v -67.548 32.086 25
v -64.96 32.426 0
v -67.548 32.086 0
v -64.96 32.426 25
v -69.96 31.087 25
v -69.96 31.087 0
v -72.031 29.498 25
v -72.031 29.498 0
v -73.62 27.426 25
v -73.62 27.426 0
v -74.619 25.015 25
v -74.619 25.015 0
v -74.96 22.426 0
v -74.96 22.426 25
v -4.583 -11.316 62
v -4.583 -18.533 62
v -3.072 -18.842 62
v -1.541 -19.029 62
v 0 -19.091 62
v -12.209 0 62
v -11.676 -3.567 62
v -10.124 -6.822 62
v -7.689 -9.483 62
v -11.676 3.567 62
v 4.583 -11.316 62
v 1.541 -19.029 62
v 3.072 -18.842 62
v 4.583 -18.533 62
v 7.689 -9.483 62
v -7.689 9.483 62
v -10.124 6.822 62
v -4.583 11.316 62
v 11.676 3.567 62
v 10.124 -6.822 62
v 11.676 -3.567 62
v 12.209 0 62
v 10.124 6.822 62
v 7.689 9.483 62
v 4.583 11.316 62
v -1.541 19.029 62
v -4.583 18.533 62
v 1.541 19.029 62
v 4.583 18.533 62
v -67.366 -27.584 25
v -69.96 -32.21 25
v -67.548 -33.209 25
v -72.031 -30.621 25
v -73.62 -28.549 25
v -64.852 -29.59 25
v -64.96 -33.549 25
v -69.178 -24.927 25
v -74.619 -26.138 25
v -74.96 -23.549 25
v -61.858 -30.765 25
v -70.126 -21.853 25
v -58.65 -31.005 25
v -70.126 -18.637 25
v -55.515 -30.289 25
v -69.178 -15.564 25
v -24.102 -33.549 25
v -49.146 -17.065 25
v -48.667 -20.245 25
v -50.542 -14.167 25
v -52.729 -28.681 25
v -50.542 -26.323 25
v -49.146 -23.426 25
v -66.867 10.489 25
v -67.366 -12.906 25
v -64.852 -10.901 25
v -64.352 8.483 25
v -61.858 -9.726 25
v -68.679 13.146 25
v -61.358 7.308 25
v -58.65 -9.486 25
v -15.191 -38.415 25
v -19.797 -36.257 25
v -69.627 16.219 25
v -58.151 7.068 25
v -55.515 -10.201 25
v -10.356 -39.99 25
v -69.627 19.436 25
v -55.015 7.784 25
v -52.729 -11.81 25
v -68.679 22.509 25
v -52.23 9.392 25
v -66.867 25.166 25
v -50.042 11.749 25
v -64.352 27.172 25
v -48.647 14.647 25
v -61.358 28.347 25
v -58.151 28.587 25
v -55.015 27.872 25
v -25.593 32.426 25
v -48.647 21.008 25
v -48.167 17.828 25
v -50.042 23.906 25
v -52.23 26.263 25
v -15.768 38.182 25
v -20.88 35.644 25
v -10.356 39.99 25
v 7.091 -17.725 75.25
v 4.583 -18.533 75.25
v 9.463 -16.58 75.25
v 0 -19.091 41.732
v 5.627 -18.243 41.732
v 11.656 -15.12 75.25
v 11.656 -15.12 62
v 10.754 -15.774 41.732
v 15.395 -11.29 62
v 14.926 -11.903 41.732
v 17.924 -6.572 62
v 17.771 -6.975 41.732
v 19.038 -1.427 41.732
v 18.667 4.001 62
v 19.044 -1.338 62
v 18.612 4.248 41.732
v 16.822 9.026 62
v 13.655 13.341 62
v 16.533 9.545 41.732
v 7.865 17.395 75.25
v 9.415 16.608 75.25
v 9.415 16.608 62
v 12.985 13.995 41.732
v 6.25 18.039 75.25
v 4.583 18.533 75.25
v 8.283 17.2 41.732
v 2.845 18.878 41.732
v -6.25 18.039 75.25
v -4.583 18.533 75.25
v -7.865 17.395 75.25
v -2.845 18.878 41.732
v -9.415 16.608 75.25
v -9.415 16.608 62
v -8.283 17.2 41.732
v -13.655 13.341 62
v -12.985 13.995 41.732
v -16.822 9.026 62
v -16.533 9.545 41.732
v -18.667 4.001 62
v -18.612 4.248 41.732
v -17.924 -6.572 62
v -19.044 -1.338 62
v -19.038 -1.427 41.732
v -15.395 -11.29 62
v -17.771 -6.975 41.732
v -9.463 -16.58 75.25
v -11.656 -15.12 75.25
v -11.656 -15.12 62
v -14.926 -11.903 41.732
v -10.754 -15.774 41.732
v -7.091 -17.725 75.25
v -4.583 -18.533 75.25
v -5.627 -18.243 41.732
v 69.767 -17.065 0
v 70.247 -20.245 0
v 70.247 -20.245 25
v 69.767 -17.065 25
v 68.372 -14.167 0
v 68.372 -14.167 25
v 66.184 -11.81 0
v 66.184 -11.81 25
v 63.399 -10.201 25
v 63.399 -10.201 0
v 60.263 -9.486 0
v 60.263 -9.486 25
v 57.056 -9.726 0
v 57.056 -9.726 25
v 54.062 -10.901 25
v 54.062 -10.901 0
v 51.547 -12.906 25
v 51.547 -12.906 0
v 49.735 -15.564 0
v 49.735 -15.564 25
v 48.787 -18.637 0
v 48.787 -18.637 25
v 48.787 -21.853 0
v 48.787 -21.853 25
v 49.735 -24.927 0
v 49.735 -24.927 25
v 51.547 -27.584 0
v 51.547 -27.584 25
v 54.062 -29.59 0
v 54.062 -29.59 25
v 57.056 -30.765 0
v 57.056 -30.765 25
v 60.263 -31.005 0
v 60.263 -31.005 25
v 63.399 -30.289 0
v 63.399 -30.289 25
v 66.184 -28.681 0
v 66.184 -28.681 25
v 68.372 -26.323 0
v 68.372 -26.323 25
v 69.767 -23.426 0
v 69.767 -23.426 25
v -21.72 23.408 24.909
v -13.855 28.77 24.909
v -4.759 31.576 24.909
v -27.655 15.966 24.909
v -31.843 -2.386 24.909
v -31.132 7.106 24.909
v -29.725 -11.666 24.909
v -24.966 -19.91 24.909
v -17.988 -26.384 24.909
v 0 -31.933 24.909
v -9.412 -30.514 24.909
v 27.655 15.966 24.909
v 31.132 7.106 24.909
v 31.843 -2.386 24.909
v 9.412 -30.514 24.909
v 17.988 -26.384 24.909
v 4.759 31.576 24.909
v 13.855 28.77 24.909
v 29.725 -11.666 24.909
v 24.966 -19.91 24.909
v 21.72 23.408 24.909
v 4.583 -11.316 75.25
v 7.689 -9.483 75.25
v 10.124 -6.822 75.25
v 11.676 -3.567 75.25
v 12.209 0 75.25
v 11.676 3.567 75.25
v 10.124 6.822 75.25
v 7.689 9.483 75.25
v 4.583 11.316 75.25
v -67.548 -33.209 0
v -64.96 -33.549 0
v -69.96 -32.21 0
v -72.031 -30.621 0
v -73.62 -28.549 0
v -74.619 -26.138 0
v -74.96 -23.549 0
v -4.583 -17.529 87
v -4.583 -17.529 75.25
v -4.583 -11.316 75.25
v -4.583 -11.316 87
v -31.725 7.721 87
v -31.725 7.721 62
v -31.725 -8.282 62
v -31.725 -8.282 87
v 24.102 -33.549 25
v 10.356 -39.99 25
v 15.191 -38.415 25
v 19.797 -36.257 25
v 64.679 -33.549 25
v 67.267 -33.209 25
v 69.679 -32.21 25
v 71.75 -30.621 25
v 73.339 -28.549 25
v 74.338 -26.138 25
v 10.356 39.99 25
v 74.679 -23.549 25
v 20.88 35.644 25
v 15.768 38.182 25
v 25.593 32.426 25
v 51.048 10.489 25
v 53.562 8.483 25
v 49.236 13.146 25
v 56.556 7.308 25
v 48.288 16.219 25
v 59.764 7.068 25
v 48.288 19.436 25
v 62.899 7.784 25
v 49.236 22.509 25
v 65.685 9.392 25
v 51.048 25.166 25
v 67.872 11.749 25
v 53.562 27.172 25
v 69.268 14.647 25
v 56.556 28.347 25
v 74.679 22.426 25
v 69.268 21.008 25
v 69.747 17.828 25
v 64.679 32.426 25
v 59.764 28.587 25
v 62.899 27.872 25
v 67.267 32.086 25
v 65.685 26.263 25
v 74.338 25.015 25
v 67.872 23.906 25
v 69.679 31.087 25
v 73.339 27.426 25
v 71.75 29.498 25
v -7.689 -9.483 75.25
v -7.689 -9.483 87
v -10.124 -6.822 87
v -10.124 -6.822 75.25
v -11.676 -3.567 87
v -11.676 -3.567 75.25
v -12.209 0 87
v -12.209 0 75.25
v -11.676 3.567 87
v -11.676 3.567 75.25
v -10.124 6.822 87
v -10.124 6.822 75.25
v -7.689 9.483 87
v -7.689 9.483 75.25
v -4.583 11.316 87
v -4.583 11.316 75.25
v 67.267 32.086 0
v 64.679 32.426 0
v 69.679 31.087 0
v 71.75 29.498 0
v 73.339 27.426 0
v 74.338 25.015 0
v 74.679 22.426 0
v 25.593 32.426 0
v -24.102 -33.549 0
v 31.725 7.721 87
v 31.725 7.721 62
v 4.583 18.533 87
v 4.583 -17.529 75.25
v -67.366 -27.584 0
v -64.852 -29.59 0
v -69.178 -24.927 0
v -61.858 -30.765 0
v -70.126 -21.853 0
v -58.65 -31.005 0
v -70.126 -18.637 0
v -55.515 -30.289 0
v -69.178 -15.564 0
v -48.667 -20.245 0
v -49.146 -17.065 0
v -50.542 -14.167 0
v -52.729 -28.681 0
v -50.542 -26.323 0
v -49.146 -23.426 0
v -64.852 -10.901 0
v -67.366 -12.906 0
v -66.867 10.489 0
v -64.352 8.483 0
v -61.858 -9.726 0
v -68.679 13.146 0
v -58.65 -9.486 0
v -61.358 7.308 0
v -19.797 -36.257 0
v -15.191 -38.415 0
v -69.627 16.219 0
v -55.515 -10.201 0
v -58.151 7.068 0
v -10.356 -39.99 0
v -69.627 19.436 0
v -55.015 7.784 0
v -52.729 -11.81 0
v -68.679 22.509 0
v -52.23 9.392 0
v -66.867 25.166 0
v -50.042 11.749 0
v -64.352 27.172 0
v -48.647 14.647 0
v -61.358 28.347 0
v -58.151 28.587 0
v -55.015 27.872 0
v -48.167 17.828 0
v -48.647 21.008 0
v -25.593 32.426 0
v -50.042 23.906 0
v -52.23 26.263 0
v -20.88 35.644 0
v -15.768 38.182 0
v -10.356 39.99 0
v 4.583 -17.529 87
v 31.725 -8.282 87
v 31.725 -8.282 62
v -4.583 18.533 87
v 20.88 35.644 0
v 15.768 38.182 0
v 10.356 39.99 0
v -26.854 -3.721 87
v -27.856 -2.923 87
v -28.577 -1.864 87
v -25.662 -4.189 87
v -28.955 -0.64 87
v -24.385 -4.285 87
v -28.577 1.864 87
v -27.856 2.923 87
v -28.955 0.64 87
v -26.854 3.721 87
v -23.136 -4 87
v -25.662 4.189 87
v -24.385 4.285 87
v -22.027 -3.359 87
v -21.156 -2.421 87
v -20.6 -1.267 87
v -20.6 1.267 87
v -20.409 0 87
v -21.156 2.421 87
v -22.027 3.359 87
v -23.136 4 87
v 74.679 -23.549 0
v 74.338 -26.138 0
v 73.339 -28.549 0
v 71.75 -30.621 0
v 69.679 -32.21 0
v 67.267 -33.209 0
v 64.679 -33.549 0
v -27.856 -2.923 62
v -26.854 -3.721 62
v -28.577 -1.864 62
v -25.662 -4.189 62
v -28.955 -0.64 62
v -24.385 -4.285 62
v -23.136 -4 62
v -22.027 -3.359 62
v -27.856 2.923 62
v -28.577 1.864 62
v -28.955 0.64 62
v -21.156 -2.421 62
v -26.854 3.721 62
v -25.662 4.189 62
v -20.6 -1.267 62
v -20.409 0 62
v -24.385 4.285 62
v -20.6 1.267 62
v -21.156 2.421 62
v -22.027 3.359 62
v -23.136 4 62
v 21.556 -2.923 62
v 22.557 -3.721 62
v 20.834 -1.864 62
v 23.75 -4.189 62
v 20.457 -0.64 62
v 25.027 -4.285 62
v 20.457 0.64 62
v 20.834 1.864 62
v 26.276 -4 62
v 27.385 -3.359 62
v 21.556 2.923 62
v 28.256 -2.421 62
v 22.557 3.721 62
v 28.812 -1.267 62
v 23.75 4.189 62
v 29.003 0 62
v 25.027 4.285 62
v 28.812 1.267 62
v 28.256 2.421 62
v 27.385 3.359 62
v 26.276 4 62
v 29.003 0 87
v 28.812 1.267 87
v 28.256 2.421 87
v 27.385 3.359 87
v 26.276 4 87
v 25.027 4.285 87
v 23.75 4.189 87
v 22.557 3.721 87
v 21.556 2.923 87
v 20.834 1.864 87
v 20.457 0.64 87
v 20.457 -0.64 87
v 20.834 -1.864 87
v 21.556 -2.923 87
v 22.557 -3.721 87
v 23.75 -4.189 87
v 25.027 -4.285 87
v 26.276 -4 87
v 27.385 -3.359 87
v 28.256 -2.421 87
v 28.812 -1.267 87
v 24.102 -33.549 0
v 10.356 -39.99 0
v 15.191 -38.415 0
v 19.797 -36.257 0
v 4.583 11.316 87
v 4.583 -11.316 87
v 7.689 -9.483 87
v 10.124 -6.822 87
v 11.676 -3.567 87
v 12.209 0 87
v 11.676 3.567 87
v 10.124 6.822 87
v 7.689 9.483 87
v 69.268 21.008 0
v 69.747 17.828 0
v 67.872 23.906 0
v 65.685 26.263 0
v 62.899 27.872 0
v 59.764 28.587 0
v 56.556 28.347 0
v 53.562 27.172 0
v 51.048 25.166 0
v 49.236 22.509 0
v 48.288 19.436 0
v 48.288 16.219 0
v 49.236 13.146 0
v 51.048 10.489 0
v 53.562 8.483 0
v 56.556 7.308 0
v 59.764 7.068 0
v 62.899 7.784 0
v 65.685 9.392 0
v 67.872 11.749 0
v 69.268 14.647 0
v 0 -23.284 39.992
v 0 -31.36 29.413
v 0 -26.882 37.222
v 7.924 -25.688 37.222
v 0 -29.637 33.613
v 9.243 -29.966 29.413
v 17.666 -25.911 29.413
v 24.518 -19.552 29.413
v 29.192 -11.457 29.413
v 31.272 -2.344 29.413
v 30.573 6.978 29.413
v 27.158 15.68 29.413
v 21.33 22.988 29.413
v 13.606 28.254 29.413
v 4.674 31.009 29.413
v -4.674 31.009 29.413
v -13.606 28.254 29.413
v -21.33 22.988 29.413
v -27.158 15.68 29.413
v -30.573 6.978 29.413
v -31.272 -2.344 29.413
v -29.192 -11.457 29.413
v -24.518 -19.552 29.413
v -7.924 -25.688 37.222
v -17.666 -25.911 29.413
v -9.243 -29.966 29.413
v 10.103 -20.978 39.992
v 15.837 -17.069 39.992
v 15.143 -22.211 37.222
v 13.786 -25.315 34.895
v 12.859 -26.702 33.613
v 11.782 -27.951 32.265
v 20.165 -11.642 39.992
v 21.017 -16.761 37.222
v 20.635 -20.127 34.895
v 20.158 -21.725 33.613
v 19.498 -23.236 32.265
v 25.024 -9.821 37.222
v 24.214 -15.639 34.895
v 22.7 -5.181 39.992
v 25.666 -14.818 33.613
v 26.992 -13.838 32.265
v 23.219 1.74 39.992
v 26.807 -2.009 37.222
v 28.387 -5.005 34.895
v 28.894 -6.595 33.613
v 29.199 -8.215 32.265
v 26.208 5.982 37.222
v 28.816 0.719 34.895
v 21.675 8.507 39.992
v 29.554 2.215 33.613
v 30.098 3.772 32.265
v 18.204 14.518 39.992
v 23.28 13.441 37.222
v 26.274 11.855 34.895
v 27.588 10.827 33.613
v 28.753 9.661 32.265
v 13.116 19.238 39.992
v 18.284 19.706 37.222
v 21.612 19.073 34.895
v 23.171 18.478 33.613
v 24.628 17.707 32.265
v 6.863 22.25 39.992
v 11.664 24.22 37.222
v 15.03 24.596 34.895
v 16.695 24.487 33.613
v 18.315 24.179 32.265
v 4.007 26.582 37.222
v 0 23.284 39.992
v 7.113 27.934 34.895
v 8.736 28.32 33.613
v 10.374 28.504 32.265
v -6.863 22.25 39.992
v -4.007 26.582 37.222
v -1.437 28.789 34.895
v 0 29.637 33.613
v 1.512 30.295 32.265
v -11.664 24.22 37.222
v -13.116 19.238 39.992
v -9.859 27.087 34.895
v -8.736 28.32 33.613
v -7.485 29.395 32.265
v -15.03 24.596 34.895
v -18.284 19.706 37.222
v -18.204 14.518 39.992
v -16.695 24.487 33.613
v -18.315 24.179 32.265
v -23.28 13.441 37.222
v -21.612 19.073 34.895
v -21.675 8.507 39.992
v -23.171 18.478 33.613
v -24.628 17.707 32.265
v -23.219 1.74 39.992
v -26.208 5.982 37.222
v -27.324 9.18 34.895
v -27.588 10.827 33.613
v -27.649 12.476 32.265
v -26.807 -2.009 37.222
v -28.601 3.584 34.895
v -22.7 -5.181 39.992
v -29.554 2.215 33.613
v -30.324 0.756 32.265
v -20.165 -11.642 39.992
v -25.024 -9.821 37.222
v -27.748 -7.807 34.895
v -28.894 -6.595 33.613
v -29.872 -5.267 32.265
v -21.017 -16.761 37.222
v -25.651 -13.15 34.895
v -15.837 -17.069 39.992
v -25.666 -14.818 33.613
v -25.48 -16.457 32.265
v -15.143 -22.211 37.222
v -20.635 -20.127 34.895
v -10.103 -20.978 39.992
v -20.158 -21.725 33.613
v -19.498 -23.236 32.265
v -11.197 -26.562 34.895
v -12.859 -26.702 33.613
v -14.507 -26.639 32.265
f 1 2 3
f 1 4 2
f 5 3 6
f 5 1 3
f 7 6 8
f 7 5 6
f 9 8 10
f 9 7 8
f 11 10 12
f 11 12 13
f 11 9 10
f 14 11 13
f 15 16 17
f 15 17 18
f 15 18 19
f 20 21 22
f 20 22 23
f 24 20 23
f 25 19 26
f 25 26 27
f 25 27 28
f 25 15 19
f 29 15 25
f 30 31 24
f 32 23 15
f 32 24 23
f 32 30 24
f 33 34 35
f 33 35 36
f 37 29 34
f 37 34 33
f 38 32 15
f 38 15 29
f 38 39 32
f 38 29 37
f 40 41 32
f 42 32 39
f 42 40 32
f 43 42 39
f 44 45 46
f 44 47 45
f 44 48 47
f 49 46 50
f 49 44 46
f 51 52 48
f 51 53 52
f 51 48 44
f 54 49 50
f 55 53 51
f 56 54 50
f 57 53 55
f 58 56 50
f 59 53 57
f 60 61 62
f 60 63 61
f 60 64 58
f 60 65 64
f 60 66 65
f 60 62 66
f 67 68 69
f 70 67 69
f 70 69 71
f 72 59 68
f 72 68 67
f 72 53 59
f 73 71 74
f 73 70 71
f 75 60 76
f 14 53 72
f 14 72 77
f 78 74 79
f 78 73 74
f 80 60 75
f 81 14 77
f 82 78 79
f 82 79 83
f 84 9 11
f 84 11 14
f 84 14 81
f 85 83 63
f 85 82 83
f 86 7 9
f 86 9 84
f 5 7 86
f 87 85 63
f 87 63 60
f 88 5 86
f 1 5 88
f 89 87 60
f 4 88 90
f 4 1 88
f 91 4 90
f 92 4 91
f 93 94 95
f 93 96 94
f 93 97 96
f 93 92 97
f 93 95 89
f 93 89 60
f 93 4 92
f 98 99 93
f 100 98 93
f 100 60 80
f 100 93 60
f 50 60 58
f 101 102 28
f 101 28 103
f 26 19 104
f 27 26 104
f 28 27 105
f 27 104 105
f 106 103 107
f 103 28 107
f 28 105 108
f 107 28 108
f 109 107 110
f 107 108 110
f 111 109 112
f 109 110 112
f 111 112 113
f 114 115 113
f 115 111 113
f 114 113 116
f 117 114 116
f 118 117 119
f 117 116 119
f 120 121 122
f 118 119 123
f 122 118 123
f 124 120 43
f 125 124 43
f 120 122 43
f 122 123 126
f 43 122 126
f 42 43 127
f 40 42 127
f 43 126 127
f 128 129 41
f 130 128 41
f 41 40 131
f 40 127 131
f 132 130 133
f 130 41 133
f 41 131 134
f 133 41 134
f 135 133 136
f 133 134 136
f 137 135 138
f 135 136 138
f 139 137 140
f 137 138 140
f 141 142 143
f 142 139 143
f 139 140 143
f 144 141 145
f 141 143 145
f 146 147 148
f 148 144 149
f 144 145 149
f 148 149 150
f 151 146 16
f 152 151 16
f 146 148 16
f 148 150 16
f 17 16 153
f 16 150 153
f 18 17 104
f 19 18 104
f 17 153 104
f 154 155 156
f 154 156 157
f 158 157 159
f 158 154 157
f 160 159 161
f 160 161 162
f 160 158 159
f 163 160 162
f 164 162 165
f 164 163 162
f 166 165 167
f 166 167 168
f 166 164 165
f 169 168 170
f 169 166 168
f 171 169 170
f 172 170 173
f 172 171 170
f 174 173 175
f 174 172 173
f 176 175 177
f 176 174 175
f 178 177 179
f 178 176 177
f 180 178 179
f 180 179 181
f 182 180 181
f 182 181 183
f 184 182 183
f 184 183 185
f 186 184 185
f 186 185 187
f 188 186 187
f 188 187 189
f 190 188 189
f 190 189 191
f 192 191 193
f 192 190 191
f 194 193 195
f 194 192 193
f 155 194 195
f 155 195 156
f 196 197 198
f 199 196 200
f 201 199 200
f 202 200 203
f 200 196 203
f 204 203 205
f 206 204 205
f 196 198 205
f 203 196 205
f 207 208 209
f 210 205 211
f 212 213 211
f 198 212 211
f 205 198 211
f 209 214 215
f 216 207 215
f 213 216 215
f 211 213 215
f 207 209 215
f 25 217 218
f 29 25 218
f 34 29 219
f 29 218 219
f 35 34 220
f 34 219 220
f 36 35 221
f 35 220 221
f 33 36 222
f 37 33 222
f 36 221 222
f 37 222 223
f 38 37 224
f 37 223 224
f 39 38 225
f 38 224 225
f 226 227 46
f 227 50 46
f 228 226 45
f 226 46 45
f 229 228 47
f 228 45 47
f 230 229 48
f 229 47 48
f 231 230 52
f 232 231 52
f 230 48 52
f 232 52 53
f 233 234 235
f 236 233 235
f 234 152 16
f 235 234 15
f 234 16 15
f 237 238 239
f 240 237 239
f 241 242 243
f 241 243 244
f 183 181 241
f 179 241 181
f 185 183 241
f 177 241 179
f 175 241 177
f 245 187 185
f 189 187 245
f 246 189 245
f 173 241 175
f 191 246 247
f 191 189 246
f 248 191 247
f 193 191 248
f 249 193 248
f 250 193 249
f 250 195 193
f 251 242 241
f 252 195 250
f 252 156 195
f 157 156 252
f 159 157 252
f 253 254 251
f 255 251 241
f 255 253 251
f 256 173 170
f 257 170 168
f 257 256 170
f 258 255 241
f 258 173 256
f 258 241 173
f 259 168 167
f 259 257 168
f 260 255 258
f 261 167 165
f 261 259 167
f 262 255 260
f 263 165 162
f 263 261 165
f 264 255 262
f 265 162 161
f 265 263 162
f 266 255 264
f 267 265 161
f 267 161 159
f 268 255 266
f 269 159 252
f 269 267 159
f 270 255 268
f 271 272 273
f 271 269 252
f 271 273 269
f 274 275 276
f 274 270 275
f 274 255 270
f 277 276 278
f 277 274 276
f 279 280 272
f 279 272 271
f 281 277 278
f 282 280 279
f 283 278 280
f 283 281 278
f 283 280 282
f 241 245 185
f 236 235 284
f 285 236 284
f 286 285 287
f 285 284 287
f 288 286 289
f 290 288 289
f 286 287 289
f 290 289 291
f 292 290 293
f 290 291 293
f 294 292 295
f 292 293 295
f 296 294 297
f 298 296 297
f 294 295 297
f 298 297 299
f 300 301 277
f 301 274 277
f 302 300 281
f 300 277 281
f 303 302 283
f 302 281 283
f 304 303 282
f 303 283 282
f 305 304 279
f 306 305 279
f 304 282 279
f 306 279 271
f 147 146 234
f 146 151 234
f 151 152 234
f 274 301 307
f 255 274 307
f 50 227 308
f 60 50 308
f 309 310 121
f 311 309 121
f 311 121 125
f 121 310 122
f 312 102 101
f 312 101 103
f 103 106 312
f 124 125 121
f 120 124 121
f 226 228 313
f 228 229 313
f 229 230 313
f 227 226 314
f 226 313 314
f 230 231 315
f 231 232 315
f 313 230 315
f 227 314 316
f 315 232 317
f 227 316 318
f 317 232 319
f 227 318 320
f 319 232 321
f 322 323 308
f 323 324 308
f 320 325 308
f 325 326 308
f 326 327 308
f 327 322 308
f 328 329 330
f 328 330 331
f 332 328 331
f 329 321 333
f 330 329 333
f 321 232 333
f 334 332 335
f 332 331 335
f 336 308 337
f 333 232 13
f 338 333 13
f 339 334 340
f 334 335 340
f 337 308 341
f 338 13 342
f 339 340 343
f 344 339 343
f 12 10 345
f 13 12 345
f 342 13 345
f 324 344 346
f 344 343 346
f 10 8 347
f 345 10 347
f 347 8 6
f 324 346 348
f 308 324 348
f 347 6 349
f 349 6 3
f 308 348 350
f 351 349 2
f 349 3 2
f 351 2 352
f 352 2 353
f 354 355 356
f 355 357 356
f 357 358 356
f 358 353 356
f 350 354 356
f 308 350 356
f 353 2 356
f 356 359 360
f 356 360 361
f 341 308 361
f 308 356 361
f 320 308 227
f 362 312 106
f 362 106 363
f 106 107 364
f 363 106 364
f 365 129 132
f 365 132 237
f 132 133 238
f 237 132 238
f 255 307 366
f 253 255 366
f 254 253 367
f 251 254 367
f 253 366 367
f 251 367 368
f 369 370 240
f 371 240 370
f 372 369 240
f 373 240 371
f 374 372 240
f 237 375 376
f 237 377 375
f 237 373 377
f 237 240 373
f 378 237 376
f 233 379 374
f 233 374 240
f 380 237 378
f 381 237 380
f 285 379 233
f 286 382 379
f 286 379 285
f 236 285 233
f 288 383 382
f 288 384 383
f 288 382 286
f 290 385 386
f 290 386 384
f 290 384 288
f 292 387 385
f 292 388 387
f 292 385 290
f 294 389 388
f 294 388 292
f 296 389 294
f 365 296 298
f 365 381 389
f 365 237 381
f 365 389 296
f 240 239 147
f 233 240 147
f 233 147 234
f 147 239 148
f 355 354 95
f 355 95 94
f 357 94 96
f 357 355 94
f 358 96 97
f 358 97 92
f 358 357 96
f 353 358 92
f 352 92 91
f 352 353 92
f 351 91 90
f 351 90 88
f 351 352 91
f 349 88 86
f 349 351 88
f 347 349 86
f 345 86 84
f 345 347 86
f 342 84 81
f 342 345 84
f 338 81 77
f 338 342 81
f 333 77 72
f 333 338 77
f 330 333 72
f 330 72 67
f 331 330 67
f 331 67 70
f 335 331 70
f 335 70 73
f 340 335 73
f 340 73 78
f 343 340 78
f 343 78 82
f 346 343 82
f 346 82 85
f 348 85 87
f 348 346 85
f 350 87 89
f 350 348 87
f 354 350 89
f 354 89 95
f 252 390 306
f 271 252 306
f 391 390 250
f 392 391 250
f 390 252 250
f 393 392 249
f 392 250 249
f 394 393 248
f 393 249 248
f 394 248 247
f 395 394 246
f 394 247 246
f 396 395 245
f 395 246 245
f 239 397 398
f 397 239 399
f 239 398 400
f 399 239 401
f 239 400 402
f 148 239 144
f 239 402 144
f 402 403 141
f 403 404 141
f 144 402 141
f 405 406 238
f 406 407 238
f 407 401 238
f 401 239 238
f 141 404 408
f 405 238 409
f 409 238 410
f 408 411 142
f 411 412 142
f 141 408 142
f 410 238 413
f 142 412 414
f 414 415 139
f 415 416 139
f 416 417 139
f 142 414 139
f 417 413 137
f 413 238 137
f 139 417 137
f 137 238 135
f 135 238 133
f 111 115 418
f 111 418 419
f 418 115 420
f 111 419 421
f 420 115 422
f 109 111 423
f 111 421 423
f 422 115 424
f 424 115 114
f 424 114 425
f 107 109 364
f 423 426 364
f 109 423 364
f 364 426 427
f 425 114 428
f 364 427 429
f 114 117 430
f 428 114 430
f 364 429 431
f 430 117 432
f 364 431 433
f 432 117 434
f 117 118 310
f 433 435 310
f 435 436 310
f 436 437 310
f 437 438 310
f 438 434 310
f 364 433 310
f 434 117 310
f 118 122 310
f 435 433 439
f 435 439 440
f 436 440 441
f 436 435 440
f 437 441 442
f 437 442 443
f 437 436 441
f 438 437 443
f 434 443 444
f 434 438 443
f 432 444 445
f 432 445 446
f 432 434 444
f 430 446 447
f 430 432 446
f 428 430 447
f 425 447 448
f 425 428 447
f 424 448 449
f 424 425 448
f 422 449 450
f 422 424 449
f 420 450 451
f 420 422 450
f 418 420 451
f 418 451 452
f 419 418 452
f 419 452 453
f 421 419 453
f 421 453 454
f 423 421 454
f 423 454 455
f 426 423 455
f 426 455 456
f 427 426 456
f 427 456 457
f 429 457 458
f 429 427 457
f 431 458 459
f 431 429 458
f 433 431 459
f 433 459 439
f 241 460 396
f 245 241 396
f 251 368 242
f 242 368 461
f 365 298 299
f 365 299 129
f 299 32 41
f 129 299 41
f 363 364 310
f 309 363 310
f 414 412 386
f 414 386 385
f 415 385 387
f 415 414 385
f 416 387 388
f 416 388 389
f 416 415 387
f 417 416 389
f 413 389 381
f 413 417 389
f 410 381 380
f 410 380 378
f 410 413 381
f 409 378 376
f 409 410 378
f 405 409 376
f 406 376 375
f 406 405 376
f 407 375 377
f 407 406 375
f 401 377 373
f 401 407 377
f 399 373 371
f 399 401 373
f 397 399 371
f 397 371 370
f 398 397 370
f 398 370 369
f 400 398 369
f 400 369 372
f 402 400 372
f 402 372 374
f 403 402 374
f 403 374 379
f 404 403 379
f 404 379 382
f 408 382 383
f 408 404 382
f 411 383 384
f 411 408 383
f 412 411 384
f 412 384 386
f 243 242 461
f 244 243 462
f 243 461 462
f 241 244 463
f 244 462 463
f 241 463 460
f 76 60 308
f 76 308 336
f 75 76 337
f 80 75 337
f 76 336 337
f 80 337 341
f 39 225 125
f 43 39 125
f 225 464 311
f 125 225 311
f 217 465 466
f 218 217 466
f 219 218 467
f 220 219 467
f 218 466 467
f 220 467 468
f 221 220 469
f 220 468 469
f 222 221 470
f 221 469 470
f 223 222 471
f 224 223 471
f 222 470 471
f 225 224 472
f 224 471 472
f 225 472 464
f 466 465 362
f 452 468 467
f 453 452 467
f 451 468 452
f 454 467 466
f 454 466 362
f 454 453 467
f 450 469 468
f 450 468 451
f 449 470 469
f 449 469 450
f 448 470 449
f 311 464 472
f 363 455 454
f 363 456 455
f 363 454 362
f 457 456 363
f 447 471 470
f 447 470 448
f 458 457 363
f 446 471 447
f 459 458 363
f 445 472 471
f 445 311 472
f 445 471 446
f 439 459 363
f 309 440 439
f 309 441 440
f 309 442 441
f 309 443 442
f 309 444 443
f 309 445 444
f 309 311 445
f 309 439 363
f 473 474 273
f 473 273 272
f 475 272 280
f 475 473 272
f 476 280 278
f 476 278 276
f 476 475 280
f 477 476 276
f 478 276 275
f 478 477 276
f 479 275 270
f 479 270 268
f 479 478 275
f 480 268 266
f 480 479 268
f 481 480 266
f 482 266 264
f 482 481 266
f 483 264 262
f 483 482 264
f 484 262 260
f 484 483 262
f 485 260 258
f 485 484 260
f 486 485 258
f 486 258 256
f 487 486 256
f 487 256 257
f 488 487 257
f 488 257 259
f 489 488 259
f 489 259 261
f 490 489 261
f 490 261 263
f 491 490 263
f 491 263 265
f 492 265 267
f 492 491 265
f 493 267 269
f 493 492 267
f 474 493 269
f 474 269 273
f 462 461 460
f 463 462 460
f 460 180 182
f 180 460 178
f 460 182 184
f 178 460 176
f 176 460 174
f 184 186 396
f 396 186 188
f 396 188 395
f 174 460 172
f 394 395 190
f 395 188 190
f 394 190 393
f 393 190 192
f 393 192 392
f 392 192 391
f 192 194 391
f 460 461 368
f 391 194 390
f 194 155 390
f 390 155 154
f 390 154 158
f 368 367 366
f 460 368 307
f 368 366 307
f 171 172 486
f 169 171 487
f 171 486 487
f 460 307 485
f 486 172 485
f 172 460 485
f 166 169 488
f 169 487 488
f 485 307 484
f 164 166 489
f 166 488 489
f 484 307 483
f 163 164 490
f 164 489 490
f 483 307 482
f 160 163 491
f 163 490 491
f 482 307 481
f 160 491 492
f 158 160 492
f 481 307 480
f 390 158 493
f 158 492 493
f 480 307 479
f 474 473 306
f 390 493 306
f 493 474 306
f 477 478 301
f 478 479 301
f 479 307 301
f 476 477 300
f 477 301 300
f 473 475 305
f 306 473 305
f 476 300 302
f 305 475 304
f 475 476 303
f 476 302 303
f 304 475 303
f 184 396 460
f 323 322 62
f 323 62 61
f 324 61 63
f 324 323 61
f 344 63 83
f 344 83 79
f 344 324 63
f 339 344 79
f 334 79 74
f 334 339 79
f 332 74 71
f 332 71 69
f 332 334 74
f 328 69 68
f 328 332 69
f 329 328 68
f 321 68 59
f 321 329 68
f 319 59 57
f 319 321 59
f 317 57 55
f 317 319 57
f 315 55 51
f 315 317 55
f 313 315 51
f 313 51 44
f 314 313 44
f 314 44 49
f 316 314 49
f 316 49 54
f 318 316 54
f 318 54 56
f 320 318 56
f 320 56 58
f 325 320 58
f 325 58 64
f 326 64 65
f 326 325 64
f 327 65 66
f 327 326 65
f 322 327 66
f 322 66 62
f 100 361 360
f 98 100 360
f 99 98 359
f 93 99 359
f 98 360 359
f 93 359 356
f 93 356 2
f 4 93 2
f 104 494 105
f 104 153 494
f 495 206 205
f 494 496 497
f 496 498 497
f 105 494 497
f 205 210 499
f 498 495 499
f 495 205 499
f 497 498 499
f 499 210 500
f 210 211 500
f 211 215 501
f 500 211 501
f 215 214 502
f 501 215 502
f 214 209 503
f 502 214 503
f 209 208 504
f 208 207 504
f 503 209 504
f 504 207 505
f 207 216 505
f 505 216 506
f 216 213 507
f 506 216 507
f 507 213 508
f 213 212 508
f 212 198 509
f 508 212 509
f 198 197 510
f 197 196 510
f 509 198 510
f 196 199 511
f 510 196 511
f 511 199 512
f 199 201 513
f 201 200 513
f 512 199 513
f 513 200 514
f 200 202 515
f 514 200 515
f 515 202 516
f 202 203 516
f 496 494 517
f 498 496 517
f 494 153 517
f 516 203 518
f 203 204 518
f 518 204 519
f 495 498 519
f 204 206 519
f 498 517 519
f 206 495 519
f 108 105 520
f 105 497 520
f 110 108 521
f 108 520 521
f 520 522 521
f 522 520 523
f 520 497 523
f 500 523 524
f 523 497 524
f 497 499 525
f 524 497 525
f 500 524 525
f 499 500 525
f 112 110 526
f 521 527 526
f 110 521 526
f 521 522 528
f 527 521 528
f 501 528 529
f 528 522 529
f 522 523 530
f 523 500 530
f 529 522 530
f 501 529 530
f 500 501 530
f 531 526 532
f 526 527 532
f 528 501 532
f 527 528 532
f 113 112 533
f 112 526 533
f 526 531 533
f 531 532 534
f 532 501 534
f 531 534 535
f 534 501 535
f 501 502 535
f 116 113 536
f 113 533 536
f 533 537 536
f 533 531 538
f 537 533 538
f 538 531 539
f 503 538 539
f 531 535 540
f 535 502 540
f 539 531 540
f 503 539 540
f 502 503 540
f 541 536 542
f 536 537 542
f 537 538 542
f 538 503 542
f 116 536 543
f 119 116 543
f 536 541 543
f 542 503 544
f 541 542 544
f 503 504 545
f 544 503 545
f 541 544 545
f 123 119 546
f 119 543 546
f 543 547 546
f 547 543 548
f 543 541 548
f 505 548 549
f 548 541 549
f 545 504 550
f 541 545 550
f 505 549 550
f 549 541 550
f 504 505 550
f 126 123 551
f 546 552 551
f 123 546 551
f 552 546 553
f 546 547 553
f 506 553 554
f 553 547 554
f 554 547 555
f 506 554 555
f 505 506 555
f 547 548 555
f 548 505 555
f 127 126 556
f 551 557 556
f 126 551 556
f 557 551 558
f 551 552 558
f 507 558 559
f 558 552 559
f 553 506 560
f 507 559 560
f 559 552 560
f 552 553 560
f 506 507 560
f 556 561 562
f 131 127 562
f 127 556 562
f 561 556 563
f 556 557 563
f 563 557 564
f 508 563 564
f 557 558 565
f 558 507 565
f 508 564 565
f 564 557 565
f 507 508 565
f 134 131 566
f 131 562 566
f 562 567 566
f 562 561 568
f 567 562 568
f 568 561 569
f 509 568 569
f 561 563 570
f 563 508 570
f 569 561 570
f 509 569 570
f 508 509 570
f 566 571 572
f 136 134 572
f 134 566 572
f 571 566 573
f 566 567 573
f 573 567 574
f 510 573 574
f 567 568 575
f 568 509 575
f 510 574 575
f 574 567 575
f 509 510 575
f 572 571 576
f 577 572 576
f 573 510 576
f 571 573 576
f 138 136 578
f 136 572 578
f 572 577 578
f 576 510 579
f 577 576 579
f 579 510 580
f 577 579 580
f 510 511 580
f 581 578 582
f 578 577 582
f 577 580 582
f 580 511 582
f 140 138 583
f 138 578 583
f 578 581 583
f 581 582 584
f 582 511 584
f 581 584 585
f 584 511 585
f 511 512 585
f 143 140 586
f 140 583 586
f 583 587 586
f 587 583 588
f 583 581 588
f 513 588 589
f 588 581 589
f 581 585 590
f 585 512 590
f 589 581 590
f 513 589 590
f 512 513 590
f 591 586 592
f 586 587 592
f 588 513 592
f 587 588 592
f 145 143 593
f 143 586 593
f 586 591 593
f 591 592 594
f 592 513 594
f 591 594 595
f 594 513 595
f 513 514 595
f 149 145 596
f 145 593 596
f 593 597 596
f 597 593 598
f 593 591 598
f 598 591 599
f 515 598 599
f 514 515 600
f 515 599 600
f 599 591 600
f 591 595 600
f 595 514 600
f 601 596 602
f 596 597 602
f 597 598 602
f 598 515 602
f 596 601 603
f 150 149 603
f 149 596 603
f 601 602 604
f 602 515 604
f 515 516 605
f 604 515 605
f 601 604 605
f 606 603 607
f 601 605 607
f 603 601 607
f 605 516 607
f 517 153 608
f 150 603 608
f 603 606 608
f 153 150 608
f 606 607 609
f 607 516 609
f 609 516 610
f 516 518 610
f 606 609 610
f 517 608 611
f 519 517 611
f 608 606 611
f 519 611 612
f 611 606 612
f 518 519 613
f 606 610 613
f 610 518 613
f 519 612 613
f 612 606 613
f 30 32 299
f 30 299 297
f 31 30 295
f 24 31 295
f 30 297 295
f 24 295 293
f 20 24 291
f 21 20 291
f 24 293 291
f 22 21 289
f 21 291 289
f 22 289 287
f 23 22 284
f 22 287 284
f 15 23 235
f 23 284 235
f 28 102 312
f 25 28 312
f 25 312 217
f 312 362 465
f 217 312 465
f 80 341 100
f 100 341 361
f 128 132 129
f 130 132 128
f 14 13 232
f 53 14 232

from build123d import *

# Parameters (mm, degrees)
F0_R     = 10.7898369592
F1_DEPTH = 25
F2_R     = 10
F2_2_R   = 10
F6_DEPTH = 13.25
F7_R     = 4.2969216764
F8_DEPTH = 25


with BuildPart() as f1:
    # F0 (on Top) → F1 (new body)
    with BuildSketch(Plane.XY):
        with BuildLine():
            ThreePointArc((-24.1020803701, -33.549465239), (-41.2989820766, -0.9332606445), (-25.5929826471, 32.4264727533))
            Line((-25.5929826471, 32.4264727533), (-74.9598965049, 32.4264727533))
            Line((-74.9598965049, 32.4264727533), (-74.9598965049, -33.549465239))
            Line((-74.9598965049, -33.549465239), (-24.1020803701, -33.549465239))
        make_face()
        with Locations((-59.456795454, -20.2453546226)):
            Circle(F0_R, mode=Mode.SUBTRACT)
        with Locations((-58.9572228491, 17.8275406361)):
            Circle(F0_R, mode=Mode.SUBTRACT)
        with BuildLine():
            Line((-10.3558397398, 32.4264727533), (-25.5929826471, 32.4264727533))
            ThreePointArc((-25.5929826471, 32.4264727533), (-41.2989820766, -0.9332606445), (-24.1020803701, -33.549465239))
            Line((-24.1020803701, -33.549465239), (-10.3558397398, -33.549465239))
            Line((-10.3558397398, -33.549465239), (-10.3558397398, 0))
            Line((-10.3558397398, 0), (-10.3558397398, 32.4264727533))
        make_face()
        with BuildLine():
            Line((-10.3558397398, -33.549465239), (-24.1020803701, -33.549465239))
            ThreePointArc((-24.1020803701, -33.549465239), (-17.5273651921, -37.4067957117), (-10.3558397398, -39.9904173431))
            Line((-10.3558397398, -39.9904173431), (-10.3558397398, -33.549465239))
        make_face()
        with BuildLine():
            Line((-10.3558397398, 32.4264727533), (-10.3558397398, 39.9904173431))
            ThreePointArc((-10.3558397398, 39.9904173431), (-18.367982257, 37.0012719214), (-25.5929826471, 32.4264727533))
            Line((-25.5929826471, 32.4264727533), (-10.3558397398, 32.4264727533))
        make_face()
    extrude(amount=F1_DEPTH)

    # F2
    f2_edges = [f1.edges().sort_by_distance(p)[0] for p in [
        (-74.959897, -33.549465, 12.5),
        (-74.959897, 32.426473, 12.5),
    ]]
    fillet(f2_edges, radius=F2_R)


with BuildPart() as f1b:
    # F0 (on Top) → F1, piece 2 (new body)
    with BuildSketch(Plane.XY):
        with BuildLine():
            ThreePointArc((41.3095254874, 0), (37.1733161351, 18.0172546054), (25.5929826471, 32.4264727533))
            Line((25.5929826471, 32.4264727533), (10.3558397398, 32.4264727533))
            Line((10.3558397398, 32.4264727533), (10.3558397398, 0))
            Line((10.3558397398, 0), (10.3558397398, -33.549465239))
            Line((10.3558397398, -33.549465239), (24.1020803701, -33.549465239))
            ThreePointArc((24.1020803701, -33.549465239), (36.7567844033, -18.8524718889), (41.3095254874, 0))
        make_face()
        with BuildLine():
            ThreePointArc((10.3558397398, -39.9904173431), (17.5273651921, -37.4067957117), (24.1020803701, -33.549465239))
            Line((24.1020803701, -33.549465239), (10.3558397398, -33.549465239))
            Line((10.3558397398, -33.549465239), (10.3558397398, -39.9904173431))
        make_face()
        with BuildLine():
            ThreePointArc((25.5929826471, 32.4264727533), (18.367982257, 37.0012719214), (10.3558397398, 39.9904173431))
            Line((10.3558397398, 39.9904173431), (10.3558397398, 32.4264727533))
            Line((10.3558397398, 32.4264727533), (25.5929826471, 32.4264727533))
        make_face()
        with BuildLine():
            Line((74.6791437268, 32.4264727533), (25.5929826471, 32.4264727533))
            ThreePointArc((25.5929826471, 32.4264727533), (37.1733161351, 18.0172546054), (41.3095254874, 0))
            ThreePointArc((41.3095254874, 0), (36.7567844033, -18.8524718889), (24.1020803701, -33.549465239))
            Line((24.1020803701, -33.549465239), (74.6791437268, -33.549465239))
            Line((74.6791437268, -33.549465239), (74.6791437268, 32.4264727533))
        make_face()
        with Locations((59.456795454, -20.2453546226)):
            Circle(F0_R, mode=Mode.SUBTRACT)
        with Locations((58.9572228491, 17.8275406361)):
            Circle(F0_R, mode=Mode.SUBTRACT)
    extrude(amount=F1_DEPTH)

    # F2#2
    f2_2_edges = [f1b.edges().sort_by_distance(p)[0] for p in [
        (74.679144, 32.426473, 12.5),
        (74.679144, -33.549465, 12.5),
    ]]
    fillet(f2_2_edges, radius=F2_2_R)


with BuildPart() as f4:
    # F3 (on Right) → F4 (revolve)
    with BuildSketch(Plane.YZ):
        Polygon((-19.0909095109, 24.9085966498), (0, 24.9085966498), (0, 75.2499066293), (-19.0909095109, 75.2499066293), (-19.0909095109, 41.7322925891), align=None)
        with BuildLine():
            Line((-31.9327436014, 24.9085966498), (-19.0909095109, 24.9085966498))
            Line((-19.0909095109, 24.9085966498), (-19.0909095109, 41.7322925891))
            ThreePointArc((-19.0909095109, 41.7322925891), (-28.3778652446, 35.5081442467), (-31.9327436014, 24.9085966498))
        make_face()
    revolve(axis=Axis((0, 0, 50.0792516395), (0, 0, 1)))

    # F5 (on face) → F6 (cut)
    with BuildSketch(Plane.XY.offset(75.2499066293)):
        with BuildLine():
            ThreePointArc((4.5833703873, -11.3155341328), (10.1243489985, -6.8224741974), (12.2085460567, 0))
            ThreePointArc((12.2085460567, 0), (10.1243489985, 6.8224741974), (4.5833703873, 11.3155341328))
            ThreePointArc((4.5833703873, 11.3155341328), (0, 12.2085460567), (-4.5833703873, 11.3155341328))
            ThreePointArc((-4.5833703873, 11.3155341328), (-12.2085460567, 0), (-4.5833703873, -11.3155341328))
            ThreePointArc((-4.5833703873, -11.3155341328), (0, -12.2085460567), (4.5833703873, -11.3155341328))
        make_face()
        with BuildLine():
            ThreePointArc((-4.5833703873, 11.3155341328), (0, 12.2085460567), (4.5833703873, 11.3155341328))
            Line((4.5833703873, 11.3155341328), (4.5833703873, 18.5325535705))
            ThreePointArc((4.5833703873, 18.5325535705), (0, 19.0909095109), (-4.5833703873, 18.5325535705))
            Line((-4.5833703873, 18.5325535705), (-4.5833703873, 11.3155341328))
        make_face()
        with BuildLine():
            Line((4.5833703873, -18.5325535705), (4.5833703873, -11.3155341328))
            ThreePointArc((4.5833703873, -11.3155341328), (0, -12.2085460567), (-4.5833703873, -11.3155341328))
            Line((-4.5833703873, -11.3155341328), (-4.5833703873, -18.5325535705))
            ThreePointArc((-4.5833703873, -18.5325535705), (0, -19.0909095109), (4.5833703873, -18.5325535705))
        make_face()
    extrude(amount=-F6_DEPTH, mode=Mode.SUBTRACT)

    # F7 (on face) → F8 (join)
    with BuildSketch(Plane.XY.offset(61.9999066293)):
        with BuildLine():
            Line((-4.5833703873, 11.3155341328), (-4.5833703873, 18.5325535705))
            Line((-4.5833703873, 18.5325535705), (-31.7245982587, 7.7205887064))
            Line((-31.7245982587, 7.7205887064), (-31.7245982587, -8.2820858806))
            Line((-31.7245982587, -8.2820858806), (-4.5833703873, -17.5293186675))
            Line((-4.5833703873, -17.5293186675), (-4.5833703873, -11.3155341328))
            ThreePointArc((-4.5833703873, -11.3155341328), (-12.2085460567, 0), (-4.5833703873, 11.3155341328))
        make_face()
        with Locations((-24.7058812529, 0)):
            Circle(F7_R, mode=Mode.SUBTRACT)
        with BuildLine():
            Line((31.7245982587, 7.7205887064), (4.5833703873, 18.5325535705))
            Line((4.5833703873, 18.5325535705), (4.5833703873, 11.3155341328))
            ThreePointArc((4.5833703873, 11.3155341328), (12.2085460567, 0), (4.5833703873, -11.3155341328))
            Line((4.5833703873, -11.3155341328), (4.5833703873, -17.5293186675))
            Line((4.5833703873, -17.5293186675), (31.7245982587, -8.2820858806))
            Line((31.7245982587, -8.2820858806), (31.7245982587, 7.7205887064))
        make_face()
        with Locations((24.7058812529, 0)):
            Circle(F7_R, mode=Mode.SUBTRACT)
    extrude(amount=F8_DEPTH)


solid = Compound([f1.part, f1b.part, f4.part])
